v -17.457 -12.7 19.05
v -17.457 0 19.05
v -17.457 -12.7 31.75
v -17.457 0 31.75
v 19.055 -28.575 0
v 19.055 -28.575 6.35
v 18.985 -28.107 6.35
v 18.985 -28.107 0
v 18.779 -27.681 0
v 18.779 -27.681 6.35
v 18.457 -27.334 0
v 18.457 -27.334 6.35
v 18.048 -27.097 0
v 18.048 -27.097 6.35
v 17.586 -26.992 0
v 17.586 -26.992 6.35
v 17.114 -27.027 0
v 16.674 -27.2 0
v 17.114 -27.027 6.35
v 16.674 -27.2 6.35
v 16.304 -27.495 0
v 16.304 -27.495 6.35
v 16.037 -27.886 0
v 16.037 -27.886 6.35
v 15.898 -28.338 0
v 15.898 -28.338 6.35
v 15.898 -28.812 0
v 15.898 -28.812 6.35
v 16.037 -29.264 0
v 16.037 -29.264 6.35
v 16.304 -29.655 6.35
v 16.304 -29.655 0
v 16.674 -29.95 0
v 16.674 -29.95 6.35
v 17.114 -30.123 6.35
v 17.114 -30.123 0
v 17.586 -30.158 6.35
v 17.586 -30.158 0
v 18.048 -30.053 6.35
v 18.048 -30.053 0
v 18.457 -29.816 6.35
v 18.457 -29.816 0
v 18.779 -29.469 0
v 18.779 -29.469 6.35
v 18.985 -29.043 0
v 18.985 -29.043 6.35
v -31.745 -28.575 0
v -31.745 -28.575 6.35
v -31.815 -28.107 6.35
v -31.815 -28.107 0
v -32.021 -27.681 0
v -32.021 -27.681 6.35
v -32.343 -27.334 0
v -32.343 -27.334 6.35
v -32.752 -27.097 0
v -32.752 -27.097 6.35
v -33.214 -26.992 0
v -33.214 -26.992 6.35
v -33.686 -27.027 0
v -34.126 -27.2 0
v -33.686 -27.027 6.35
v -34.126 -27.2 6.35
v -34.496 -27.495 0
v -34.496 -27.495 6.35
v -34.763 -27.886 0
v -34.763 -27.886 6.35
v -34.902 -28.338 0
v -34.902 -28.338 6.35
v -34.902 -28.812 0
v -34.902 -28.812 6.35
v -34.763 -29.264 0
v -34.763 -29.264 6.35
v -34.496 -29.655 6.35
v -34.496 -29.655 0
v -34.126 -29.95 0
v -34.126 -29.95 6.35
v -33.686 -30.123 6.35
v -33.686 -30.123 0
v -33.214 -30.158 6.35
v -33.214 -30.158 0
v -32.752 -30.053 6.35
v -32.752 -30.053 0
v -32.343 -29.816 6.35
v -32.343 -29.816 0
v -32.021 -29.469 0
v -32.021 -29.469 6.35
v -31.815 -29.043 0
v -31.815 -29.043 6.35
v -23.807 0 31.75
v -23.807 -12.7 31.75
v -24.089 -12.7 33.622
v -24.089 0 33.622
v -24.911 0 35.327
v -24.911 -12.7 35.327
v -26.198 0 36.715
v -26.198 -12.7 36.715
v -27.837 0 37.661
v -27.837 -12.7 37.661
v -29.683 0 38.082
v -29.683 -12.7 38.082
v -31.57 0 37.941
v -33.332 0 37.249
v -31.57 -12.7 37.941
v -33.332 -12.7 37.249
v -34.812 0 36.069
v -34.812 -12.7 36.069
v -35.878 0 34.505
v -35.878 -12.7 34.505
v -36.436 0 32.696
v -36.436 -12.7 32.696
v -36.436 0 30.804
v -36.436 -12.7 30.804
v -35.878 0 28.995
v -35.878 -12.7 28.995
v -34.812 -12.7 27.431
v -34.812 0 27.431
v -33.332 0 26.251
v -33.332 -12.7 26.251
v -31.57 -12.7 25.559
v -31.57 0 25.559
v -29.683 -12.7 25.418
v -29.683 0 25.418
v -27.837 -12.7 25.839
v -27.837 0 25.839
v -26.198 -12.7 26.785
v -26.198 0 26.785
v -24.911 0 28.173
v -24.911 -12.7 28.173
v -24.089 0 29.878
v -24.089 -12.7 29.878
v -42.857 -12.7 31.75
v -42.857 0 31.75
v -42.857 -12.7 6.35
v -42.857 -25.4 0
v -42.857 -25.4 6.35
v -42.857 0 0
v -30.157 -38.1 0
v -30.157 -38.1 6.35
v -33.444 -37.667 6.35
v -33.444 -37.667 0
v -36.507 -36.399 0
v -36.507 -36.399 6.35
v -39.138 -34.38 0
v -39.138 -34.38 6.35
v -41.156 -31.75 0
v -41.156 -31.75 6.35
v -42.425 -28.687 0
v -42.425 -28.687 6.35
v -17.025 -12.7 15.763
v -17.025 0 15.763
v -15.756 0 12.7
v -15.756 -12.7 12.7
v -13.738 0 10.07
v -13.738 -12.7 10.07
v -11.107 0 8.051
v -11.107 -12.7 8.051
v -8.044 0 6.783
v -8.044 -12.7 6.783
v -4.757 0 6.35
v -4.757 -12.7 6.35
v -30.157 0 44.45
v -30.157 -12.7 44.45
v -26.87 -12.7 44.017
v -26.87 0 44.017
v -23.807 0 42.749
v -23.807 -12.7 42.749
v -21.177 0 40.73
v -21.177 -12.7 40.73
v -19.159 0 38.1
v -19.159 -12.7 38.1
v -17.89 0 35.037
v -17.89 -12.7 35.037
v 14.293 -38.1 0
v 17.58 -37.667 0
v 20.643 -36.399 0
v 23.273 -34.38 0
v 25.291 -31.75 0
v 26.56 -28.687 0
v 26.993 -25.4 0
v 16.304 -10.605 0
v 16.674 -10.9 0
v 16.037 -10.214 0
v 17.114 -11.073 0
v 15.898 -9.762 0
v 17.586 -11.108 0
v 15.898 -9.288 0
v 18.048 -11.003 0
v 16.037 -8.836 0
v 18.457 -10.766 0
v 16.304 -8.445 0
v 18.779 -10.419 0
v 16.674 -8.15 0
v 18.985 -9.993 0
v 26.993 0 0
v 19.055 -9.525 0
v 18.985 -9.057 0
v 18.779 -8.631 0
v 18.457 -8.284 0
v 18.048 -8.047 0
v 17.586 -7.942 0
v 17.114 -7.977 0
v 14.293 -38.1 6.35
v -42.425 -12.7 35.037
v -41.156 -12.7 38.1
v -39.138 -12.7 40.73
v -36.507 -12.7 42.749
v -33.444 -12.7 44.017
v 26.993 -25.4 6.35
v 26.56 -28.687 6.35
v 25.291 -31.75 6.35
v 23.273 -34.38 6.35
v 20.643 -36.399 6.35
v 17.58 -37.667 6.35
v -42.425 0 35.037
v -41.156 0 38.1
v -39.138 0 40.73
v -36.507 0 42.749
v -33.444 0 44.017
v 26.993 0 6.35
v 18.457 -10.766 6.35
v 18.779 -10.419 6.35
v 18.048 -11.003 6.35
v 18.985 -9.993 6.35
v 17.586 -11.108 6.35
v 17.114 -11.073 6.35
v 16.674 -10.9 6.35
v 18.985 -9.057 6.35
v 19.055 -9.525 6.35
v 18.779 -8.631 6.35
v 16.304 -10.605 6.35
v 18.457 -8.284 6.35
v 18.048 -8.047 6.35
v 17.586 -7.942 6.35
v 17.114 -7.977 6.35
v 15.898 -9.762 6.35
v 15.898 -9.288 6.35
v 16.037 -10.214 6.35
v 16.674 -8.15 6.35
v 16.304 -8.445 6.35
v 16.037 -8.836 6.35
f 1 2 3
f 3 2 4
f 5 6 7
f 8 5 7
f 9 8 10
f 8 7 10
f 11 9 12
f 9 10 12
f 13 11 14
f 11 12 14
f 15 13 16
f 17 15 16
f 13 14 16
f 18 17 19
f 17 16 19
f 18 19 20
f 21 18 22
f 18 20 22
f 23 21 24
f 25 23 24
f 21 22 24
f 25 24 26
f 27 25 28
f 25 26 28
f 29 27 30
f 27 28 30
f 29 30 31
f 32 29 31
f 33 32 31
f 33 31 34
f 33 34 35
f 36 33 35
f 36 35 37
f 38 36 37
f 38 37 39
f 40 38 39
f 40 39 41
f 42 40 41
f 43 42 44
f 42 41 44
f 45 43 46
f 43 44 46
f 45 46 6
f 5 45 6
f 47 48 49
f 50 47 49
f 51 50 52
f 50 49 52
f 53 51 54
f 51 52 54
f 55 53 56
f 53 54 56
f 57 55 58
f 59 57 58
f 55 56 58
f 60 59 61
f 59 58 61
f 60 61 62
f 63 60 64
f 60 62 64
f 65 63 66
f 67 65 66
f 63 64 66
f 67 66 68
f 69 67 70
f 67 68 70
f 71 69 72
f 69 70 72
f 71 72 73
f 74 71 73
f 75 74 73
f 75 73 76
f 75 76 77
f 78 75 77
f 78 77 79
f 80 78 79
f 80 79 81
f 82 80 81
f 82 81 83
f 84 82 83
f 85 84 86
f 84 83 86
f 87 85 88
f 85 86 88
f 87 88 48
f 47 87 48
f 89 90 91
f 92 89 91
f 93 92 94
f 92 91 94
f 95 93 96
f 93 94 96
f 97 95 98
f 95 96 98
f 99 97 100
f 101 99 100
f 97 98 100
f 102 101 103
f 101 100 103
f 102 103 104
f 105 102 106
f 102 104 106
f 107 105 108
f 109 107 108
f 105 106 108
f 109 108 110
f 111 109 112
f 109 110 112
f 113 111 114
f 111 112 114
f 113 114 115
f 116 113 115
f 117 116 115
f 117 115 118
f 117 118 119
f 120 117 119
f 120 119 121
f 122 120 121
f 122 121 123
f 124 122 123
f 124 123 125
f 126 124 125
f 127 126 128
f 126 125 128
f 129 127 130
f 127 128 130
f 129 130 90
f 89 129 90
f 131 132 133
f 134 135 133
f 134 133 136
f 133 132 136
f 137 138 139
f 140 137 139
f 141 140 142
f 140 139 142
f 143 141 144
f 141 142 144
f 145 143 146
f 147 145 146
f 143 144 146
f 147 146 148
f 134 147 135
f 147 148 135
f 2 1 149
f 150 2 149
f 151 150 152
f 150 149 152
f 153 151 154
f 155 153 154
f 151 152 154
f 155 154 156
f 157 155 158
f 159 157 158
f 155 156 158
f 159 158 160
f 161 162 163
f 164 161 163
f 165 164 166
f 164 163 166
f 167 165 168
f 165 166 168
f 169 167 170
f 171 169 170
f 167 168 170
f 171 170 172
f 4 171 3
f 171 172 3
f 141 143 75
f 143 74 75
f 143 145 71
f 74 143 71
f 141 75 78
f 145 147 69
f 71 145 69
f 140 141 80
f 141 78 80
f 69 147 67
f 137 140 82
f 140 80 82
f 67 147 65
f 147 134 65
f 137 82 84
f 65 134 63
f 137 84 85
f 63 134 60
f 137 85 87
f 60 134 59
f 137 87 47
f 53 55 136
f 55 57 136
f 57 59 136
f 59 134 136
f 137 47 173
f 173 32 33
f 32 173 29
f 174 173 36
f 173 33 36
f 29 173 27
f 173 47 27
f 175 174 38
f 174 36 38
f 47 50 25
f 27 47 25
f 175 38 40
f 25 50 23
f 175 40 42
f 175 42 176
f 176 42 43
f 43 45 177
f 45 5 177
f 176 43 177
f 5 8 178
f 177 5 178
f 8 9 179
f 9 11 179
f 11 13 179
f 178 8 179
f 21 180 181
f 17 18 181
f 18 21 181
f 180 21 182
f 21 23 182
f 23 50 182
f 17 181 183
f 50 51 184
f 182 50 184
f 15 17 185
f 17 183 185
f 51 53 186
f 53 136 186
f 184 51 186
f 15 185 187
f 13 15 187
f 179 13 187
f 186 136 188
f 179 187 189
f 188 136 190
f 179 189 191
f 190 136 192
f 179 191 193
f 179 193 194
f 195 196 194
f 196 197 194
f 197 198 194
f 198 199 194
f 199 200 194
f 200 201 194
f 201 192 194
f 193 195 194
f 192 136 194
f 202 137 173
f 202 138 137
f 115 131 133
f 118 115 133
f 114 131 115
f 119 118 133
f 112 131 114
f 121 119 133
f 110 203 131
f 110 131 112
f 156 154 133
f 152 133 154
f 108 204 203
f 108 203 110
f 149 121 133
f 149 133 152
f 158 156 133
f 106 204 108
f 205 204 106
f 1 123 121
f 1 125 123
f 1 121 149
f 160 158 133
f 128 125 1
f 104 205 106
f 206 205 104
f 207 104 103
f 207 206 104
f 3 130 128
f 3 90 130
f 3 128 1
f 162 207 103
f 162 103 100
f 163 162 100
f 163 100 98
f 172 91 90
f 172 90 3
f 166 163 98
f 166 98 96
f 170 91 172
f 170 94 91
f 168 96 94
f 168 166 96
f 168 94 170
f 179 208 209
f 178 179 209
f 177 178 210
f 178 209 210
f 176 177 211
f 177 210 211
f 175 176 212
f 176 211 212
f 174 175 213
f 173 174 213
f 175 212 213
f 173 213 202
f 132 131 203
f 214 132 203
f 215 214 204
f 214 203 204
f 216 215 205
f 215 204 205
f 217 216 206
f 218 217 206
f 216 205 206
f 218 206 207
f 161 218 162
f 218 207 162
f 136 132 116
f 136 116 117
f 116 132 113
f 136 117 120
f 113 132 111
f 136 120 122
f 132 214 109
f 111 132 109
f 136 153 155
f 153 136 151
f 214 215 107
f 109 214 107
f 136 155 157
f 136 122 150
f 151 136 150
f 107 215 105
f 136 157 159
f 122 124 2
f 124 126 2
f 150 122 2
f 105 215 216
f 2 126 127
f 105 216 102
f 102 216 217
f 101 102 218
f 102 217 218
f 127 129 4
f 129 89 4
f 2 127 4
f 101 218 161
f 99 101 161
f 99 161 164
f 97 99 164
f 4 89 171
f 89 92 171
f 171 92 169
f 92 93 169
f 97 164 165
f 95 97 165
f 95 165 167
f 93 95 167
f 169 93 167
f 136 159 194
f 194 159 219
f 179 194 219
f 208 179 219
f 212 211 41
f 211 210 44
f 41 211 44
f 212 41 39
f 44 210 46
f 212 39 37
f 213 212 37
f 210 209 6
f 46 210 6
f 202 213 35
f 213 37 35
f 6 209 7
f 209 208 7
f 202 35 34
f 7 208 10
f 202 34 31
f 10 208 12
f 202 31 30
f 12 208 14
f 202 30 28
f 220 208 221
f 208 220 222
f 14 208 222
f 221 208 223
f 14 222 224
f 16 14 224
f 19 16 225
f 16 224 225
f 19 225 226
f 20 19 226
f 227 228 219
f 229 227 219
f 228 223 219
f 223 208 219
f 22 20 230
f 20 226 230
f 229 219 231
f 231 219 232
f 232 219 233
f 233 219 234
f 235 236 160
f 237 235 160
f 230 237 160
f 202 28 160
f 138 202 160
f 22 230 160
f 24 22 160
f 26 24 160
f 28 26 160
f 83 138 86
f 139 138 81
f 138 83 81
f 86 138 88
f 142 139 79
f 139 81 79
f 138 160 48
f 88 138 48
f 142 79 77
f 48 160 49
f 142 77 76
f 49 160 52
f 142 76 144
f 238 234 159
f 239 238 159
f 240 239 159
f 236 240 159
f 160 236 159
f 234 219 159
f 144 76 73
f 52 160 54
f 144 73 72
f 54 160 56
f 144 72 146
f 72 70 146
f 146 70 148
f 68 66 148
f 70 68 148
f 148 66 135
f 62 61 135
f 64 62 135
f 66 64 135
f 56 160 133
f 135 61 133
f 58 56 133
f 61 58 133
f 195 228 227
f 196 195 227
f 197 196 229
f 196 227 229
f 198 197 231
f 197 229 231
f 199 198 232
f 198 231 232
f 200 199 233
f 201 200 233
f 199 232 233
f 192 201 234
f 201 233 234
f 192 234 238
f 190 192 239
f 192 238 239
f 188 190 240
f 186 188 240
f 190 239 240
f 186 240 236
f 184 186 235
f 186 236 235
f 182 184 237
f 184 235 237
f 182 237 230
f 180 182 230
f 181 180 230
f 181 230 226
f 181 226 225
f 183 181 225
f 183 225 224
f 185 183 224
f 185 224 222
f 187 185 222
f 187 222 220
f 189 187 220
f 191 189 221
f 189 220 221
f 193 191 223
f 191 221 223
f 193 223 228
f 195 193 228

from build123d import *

# Parameters (mm, degrees)
F1_DEPTH  = 38.1
F2_W      = 25.4
F2_H      = 38.1
F3_DEPTH  = 25.4
F4_R      = 6.35
F5_DEPTH  = 12.7
F7_DEPTH  = 12.7
F8_W      = 12.7
F8_H      = 12.7
F9_DEPTH  = 12.7
F11_DEPTH = 12.7
F12_R     = 1.5875
F13_DEPTH = 6.35
F15_DEPTH = 6.35


with BuildPart() as f1:
    # F0 (on Front) → F1 (new body)
    with BuildSketch(Plane.XZ):
        Polygon((-17.457331, 44.45), (-42.857331, 44.45), (-42.857331, 0), (26.992669, 0), (26.992669, 6.35), (-17.457331, 6.35), align=None)
    extrude(amount=F1_DEPTH)

    # F2 (on face) → F3 (cut)
    with BuildSketch(Plane.XZ.offset(38.1)):
        with Locations((-30.157331, 25.4)):
            Rectangle(F2_W, F2_H)
    extrude(amount=-F3_DEPTH, mode=Mode.SUBTRACT)

    # F4 (on face) → F5 (cut)
    with BuildSketch(Plane.XZ.offset(12.7)):
        with Locations((-30.157331, 31.75)):
            Circle(F4_R)
    extrude(amount=-F5_DEPTH, mode=Mode.SUBTRACT)

    # F6 (on face) → F7 (cut)
    with BuildSketch(Plane.XZ.offset(12.7)):
        with BuildLine():
            ThreePointArc((-42.857331, 31.75), (-39.137587, 40.730256), (-30.157331, 44.45))
            Line((-30.157331, 44.45), (-42.857331, 44.45))
            Line((-42.857331, 44.45), (-42.857331, 31.75))
        make_face()
        with BuildLine():
            Line((-17.457331, 44.45), (-30.157331, 44.45))
            ThreePointArc((-30.157331, 44.45), (-21.177075, 40.730256), (-17.457331, 31.75))
            Line((-17.457331, 31.75), (-17.457331, 44.45))
        make_face()
    extrude(amount=-F7_DEPTH, mode=Mode.SUBTRACT)

    # F8 (on face) → F9 (join)
    with BuildSketch(Plane.XZ.offset(12.7)):
        with Locations((-11.107331, 12.7)):
            Rectangle(F8_W, F8_H)
    extrude(amount=-F9_DEPTH)

    # F10 (on face) → F11 (cut)
    with BuildSketch(Plane.XZ.offset(12.7)):
        with BuildLine():
            Line((-4.757331, 19.05), (-17.457331, 19.05))
            ThreePointArc((-17.457331, 19.05), (-13.737587, 10.069744), (-4.757331, 6.35))
            Line((-4.757331, 6.35), (-4.757331, 19.05))
        make_face()
    extrude(amount=-F11_DEPTH, mode=Mode.SUBTRACT)

    # F12 (on face) → F13 (cut)
    with BuildSketch(Plane.XY.offset(6.35)):
        with Locations((-33.332331, -28.575)):
            Circle(F12_R)
        with Locations((17.467669, -28.575)):
            Circle(F12_R)
        with Locations((17.467669, -9.525)):
            Circle(F12_R)
    extrude(amount=-F13_DEPTH, mode=Mode.SUBTRACT)

    # F14 (on face) → F15 (cut)
    with BuildSketch(Plane.XY.offset(6.35)):
        with BuildLine():
            ThreePointArc((-30.157331, -38.1), (-39.137587, -34.380256), (-42.857331, -25.4))
            Line((-42.857331, -25.4), (-42.857331, -38.1))
            Line((-42.857331, -38.1), (-30.157331, -38.1))
        make_face()
        with BuildLine():
            ThreePointArc((26.992669, -25.4), (23.272925, -34.380256), (14.292669, -38.1))
            Line((14.292669, -38.1), (26.992669, -38.1))
            Line((26.992669, -38.1), (26.992669, -25.4))
        make_face()
    extrude(amount=-F15_DEPTH, mode=Mode.SUBTRACT)


solid = f1.part
